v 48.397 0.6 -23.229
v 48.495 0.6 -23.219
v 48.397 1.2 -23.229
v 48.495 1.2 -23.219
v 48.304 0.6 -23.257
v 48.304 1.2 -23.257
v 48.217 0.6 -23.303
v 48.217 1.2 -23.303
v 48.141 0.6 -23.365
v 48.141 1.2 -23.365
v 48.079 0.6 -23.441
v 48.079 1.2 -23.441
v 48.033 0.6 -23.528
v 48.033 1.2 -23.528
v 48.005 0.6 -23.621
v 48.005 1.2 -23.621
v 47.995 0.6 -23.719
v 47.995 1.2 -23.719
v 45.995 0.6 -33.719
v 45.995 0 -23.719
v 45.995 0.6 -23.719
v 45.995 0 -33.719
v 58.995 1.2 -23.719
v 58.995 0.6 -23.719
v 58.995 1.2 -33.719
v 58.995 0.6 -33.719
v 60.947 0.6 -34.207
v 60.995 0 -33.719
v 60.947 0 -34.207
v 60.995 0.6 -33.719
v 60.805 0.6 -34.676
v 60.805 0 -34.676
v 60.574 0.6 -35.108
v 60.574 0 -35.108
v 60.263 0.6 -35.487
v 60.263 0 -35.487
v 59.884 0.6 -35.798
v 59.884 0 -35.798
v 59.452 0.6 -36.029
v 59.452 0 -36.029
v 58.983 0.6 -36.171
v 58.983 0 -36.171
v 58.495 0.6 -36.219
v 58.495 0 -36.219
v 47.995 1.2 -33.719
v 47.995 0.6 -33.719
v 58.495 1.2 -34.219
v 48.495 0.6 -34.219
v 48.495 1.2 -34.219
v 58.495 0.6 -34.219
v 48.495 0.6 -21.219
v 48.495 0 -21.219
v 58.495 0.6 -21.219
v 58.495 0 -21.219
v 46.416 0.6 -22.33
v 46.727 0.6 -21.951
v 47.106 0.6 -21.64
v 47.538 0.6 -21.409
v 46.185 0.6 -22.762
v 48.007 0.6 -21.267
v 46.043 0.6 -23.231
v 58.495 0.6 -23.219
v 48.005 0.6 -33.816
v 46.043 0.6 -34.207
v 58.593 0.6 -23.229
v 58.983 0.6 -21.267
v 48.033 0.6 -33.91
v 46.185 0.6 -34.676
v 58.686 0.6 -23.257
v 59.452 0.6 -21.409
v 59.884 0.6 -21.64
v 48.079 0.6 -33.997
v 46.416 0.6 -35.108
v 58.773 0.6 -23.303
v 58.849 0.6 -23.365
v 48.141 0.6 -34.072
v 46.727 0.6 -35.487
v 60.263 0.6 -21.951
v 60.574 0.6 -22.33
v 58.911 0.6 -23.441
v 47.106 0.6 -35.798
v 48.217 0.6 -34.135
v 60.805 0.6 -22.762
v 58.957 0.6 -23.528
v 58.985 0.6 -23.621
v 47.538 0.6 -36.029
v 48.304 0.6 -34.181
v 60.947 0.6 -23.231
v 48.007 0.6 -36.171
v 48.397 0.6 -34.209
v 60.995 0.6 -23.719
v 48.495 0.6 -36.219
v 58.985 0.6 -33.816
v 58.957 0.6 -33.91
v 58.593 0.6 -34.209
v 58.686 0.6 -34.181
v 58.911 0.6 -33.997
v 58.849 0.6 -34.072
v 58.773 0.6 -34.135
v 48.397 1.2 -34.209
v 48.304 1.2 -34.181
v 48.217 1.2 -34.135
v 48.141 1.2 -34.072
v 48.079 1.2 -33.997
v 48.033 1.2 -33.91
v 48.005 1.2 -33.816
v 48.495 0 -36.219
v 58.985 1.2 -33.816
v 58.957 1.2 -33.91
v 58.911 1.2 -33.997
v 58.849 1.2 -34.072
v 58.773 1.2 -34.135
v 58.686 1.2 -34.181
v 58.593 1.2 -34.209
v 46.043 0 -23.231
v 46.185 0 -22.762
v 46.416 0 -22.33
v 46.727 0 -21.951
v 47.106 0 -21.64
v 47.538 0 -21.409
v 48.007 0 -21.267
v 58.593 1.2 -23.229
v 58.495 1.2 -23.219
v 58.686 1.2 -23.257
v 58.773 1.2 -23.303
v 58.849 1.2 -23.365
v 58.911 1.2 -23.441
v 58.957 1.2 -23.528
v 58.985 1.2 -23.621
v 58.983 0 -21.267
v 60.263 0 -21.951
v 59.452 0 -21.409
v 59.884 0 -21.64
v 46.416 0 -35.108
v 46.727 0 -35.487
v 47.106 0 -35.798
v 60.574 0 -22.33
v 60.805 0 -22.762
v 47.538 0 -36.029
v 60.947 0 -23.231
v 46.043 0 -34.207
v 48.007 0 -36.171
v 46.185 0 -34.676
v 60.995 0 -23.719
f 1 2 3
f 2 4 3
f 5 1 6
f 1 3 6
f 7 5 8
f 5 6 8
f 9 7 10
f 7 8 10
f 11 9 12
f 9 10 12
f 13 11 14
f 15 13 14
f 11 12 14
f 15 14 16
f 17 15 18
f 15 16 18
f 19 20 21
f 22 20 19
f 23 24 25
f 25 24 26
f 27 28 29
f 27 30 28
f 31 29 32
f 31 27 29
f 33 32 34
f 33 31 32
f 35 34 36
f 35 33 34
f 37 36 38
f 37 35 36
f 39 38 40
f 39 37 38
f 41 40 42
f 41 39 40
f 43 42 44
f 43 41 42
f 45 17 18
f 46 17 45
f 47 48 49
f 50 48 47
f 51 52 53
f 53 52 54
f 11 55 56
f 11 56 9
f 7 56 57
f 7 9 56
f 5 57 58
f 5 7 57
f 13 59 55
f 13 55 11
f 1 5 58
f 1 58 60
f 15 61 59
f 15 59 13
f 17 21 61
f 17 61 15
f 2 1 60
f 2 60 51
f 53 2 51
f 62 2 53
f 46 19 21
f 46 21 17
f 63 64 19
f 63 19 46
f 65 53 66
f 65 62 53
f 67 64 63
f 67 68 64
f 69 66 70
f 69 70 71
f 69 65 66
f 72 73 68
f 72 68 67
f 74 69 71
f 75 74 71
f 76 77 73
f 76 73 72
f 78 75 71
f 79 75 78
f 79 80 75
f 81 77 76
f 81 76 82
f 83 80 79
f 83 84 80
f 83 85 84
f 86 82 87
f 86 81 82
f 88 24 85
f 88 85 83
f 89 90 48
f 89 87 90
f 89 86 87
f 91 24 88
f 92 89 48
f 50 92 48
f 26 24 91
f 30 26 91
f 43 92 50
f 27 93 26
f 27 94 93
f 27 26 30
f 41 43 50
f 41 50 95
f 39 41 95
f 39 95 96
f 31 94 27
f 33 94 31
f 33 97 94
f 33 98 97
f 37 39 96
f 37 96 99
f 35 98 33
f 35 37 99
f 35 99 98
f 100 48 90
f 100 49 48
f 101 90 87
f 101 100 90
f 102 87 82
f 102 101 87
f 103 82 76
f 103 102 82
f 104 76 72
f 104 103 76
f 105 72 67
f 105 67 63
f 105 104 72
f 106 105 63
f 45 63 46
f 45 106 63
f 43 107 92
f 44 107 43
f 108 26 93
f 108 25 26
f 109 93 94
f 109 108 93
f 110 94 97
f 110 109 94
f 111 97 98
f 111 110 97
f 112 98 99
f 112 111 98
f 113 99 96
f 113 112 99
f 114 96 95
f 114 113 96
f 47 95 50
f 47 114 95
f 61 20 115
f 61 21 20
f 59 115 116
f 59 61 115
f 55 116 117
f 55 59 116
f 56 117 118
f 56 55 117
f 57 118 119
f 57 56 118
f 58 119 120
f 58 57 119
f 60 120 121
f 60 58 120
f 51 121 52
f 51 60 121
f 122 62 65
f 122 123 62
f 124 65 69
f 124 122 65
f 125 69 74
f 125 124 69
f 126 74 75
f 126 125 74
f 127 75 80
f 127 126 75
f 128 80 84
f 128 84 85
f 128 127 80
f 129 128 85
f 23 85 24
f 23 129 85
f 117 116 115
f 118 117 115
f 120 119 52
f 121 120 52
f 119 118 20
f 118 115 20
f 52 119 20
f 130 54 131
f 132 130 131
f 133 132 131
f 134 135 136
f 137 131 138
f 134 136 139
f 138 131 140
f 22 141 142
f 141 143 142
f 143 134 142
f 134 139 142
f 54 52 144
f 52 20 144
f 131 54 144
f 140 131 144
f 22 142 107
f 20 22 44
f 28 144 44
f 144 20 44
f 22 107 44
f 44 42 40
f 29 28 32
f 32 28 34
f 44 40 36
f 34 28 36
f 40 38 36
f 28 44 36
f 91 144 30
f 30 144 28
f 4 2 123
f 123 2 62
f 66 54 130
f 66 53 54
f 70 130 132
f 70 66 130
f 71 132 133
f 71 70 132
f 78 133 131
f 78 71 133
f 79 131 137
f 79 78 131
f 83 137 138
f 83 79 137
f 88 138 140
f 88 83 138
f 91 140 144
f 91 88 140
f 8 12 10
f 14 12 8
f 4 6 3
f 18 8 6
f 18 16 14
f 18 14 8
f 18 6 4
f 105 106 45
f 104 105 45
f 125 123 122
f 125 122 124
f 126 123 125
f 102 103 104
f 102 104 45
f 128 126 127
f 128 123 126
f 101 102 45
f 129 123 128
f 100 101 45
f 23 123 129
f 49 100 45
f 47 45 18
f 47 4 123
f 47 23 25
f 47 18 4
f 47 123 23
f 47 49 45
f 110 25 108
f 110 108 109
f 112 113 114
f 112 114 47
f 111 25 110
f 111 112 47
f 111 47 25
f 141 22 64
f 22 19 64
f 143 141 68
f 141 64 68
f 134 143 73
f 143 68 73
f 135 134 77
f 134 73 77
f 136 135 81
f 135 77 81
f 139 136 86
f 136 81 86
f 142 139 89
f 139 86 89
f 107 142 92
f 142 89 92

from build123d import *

# Parameters (mm, degrees)
SKETCH_1_W      = 15
SKETCH_1_H      = 15
EXTRUDE_1_DEPTH = 0.6
FILLET_1_R      = 2.5
SKETCH_2_W      = 11
SKETCH_2_H      = 11
EXTRUDE_2_DEPTH = 0.6
FILLET_2_R      = 0.5


with BuildPart() as part:
    # 草图1 → 凸台-拉伸1 (new body)
    with BuildSketch(Plane(origin=(0, 0, 0), x_dir=(1, 0, 0), z_dir=(0, 1, 0))):
        with Locations((53.495024876, 28.718905473)):
            Rectangle(SKETCH_1_W, SKETCH_1_H)
    extrude(amount=EXTRUDE_1_DEPTH)

    # 圆角1
    fillet_1_edges = [part.edges().sort_by_distance(p)[0] for p in [
        (45.995024876, 0.3, -36.218905473),
        (60.995024876, 0.3, -36.218905473),
        (60.995024876, 0.3, -21.218905473),
        (45.995024876, 0.3, -21.218905473),
    ]]
    fillet(fillet_1_edges, radius=FILLET_1_R)

    # 草图2 → 凸台-拉伸2 (add)
    with BuildSketch(Plane(origin=(0, 0.6, 0), x_dir=(1, 0, 0), z_dir=(0, 1, 0))):
        with Locations((53.495024876, 28.718905473)):
            Rectangle(SKETCH_2_W, SKETCH_2_H)
    extrude(amount=EXTRUDE_2_DEPTH)

    # 圆角2
    fillet_2_edges = [part.edges().sort_by_distance(p)[0] for p in [
        (47.995024876, 0.9, -34.218905473),
        (47.995024876, 0.9, -23.218905473),
        (58.995024876, 0.9, -23.218905473),
        (58.995024876, 0.9, -34.218905473),
    ]]
    fillet(fillet_2_edges, radius=FILLET_2_R)


solid = part.part
